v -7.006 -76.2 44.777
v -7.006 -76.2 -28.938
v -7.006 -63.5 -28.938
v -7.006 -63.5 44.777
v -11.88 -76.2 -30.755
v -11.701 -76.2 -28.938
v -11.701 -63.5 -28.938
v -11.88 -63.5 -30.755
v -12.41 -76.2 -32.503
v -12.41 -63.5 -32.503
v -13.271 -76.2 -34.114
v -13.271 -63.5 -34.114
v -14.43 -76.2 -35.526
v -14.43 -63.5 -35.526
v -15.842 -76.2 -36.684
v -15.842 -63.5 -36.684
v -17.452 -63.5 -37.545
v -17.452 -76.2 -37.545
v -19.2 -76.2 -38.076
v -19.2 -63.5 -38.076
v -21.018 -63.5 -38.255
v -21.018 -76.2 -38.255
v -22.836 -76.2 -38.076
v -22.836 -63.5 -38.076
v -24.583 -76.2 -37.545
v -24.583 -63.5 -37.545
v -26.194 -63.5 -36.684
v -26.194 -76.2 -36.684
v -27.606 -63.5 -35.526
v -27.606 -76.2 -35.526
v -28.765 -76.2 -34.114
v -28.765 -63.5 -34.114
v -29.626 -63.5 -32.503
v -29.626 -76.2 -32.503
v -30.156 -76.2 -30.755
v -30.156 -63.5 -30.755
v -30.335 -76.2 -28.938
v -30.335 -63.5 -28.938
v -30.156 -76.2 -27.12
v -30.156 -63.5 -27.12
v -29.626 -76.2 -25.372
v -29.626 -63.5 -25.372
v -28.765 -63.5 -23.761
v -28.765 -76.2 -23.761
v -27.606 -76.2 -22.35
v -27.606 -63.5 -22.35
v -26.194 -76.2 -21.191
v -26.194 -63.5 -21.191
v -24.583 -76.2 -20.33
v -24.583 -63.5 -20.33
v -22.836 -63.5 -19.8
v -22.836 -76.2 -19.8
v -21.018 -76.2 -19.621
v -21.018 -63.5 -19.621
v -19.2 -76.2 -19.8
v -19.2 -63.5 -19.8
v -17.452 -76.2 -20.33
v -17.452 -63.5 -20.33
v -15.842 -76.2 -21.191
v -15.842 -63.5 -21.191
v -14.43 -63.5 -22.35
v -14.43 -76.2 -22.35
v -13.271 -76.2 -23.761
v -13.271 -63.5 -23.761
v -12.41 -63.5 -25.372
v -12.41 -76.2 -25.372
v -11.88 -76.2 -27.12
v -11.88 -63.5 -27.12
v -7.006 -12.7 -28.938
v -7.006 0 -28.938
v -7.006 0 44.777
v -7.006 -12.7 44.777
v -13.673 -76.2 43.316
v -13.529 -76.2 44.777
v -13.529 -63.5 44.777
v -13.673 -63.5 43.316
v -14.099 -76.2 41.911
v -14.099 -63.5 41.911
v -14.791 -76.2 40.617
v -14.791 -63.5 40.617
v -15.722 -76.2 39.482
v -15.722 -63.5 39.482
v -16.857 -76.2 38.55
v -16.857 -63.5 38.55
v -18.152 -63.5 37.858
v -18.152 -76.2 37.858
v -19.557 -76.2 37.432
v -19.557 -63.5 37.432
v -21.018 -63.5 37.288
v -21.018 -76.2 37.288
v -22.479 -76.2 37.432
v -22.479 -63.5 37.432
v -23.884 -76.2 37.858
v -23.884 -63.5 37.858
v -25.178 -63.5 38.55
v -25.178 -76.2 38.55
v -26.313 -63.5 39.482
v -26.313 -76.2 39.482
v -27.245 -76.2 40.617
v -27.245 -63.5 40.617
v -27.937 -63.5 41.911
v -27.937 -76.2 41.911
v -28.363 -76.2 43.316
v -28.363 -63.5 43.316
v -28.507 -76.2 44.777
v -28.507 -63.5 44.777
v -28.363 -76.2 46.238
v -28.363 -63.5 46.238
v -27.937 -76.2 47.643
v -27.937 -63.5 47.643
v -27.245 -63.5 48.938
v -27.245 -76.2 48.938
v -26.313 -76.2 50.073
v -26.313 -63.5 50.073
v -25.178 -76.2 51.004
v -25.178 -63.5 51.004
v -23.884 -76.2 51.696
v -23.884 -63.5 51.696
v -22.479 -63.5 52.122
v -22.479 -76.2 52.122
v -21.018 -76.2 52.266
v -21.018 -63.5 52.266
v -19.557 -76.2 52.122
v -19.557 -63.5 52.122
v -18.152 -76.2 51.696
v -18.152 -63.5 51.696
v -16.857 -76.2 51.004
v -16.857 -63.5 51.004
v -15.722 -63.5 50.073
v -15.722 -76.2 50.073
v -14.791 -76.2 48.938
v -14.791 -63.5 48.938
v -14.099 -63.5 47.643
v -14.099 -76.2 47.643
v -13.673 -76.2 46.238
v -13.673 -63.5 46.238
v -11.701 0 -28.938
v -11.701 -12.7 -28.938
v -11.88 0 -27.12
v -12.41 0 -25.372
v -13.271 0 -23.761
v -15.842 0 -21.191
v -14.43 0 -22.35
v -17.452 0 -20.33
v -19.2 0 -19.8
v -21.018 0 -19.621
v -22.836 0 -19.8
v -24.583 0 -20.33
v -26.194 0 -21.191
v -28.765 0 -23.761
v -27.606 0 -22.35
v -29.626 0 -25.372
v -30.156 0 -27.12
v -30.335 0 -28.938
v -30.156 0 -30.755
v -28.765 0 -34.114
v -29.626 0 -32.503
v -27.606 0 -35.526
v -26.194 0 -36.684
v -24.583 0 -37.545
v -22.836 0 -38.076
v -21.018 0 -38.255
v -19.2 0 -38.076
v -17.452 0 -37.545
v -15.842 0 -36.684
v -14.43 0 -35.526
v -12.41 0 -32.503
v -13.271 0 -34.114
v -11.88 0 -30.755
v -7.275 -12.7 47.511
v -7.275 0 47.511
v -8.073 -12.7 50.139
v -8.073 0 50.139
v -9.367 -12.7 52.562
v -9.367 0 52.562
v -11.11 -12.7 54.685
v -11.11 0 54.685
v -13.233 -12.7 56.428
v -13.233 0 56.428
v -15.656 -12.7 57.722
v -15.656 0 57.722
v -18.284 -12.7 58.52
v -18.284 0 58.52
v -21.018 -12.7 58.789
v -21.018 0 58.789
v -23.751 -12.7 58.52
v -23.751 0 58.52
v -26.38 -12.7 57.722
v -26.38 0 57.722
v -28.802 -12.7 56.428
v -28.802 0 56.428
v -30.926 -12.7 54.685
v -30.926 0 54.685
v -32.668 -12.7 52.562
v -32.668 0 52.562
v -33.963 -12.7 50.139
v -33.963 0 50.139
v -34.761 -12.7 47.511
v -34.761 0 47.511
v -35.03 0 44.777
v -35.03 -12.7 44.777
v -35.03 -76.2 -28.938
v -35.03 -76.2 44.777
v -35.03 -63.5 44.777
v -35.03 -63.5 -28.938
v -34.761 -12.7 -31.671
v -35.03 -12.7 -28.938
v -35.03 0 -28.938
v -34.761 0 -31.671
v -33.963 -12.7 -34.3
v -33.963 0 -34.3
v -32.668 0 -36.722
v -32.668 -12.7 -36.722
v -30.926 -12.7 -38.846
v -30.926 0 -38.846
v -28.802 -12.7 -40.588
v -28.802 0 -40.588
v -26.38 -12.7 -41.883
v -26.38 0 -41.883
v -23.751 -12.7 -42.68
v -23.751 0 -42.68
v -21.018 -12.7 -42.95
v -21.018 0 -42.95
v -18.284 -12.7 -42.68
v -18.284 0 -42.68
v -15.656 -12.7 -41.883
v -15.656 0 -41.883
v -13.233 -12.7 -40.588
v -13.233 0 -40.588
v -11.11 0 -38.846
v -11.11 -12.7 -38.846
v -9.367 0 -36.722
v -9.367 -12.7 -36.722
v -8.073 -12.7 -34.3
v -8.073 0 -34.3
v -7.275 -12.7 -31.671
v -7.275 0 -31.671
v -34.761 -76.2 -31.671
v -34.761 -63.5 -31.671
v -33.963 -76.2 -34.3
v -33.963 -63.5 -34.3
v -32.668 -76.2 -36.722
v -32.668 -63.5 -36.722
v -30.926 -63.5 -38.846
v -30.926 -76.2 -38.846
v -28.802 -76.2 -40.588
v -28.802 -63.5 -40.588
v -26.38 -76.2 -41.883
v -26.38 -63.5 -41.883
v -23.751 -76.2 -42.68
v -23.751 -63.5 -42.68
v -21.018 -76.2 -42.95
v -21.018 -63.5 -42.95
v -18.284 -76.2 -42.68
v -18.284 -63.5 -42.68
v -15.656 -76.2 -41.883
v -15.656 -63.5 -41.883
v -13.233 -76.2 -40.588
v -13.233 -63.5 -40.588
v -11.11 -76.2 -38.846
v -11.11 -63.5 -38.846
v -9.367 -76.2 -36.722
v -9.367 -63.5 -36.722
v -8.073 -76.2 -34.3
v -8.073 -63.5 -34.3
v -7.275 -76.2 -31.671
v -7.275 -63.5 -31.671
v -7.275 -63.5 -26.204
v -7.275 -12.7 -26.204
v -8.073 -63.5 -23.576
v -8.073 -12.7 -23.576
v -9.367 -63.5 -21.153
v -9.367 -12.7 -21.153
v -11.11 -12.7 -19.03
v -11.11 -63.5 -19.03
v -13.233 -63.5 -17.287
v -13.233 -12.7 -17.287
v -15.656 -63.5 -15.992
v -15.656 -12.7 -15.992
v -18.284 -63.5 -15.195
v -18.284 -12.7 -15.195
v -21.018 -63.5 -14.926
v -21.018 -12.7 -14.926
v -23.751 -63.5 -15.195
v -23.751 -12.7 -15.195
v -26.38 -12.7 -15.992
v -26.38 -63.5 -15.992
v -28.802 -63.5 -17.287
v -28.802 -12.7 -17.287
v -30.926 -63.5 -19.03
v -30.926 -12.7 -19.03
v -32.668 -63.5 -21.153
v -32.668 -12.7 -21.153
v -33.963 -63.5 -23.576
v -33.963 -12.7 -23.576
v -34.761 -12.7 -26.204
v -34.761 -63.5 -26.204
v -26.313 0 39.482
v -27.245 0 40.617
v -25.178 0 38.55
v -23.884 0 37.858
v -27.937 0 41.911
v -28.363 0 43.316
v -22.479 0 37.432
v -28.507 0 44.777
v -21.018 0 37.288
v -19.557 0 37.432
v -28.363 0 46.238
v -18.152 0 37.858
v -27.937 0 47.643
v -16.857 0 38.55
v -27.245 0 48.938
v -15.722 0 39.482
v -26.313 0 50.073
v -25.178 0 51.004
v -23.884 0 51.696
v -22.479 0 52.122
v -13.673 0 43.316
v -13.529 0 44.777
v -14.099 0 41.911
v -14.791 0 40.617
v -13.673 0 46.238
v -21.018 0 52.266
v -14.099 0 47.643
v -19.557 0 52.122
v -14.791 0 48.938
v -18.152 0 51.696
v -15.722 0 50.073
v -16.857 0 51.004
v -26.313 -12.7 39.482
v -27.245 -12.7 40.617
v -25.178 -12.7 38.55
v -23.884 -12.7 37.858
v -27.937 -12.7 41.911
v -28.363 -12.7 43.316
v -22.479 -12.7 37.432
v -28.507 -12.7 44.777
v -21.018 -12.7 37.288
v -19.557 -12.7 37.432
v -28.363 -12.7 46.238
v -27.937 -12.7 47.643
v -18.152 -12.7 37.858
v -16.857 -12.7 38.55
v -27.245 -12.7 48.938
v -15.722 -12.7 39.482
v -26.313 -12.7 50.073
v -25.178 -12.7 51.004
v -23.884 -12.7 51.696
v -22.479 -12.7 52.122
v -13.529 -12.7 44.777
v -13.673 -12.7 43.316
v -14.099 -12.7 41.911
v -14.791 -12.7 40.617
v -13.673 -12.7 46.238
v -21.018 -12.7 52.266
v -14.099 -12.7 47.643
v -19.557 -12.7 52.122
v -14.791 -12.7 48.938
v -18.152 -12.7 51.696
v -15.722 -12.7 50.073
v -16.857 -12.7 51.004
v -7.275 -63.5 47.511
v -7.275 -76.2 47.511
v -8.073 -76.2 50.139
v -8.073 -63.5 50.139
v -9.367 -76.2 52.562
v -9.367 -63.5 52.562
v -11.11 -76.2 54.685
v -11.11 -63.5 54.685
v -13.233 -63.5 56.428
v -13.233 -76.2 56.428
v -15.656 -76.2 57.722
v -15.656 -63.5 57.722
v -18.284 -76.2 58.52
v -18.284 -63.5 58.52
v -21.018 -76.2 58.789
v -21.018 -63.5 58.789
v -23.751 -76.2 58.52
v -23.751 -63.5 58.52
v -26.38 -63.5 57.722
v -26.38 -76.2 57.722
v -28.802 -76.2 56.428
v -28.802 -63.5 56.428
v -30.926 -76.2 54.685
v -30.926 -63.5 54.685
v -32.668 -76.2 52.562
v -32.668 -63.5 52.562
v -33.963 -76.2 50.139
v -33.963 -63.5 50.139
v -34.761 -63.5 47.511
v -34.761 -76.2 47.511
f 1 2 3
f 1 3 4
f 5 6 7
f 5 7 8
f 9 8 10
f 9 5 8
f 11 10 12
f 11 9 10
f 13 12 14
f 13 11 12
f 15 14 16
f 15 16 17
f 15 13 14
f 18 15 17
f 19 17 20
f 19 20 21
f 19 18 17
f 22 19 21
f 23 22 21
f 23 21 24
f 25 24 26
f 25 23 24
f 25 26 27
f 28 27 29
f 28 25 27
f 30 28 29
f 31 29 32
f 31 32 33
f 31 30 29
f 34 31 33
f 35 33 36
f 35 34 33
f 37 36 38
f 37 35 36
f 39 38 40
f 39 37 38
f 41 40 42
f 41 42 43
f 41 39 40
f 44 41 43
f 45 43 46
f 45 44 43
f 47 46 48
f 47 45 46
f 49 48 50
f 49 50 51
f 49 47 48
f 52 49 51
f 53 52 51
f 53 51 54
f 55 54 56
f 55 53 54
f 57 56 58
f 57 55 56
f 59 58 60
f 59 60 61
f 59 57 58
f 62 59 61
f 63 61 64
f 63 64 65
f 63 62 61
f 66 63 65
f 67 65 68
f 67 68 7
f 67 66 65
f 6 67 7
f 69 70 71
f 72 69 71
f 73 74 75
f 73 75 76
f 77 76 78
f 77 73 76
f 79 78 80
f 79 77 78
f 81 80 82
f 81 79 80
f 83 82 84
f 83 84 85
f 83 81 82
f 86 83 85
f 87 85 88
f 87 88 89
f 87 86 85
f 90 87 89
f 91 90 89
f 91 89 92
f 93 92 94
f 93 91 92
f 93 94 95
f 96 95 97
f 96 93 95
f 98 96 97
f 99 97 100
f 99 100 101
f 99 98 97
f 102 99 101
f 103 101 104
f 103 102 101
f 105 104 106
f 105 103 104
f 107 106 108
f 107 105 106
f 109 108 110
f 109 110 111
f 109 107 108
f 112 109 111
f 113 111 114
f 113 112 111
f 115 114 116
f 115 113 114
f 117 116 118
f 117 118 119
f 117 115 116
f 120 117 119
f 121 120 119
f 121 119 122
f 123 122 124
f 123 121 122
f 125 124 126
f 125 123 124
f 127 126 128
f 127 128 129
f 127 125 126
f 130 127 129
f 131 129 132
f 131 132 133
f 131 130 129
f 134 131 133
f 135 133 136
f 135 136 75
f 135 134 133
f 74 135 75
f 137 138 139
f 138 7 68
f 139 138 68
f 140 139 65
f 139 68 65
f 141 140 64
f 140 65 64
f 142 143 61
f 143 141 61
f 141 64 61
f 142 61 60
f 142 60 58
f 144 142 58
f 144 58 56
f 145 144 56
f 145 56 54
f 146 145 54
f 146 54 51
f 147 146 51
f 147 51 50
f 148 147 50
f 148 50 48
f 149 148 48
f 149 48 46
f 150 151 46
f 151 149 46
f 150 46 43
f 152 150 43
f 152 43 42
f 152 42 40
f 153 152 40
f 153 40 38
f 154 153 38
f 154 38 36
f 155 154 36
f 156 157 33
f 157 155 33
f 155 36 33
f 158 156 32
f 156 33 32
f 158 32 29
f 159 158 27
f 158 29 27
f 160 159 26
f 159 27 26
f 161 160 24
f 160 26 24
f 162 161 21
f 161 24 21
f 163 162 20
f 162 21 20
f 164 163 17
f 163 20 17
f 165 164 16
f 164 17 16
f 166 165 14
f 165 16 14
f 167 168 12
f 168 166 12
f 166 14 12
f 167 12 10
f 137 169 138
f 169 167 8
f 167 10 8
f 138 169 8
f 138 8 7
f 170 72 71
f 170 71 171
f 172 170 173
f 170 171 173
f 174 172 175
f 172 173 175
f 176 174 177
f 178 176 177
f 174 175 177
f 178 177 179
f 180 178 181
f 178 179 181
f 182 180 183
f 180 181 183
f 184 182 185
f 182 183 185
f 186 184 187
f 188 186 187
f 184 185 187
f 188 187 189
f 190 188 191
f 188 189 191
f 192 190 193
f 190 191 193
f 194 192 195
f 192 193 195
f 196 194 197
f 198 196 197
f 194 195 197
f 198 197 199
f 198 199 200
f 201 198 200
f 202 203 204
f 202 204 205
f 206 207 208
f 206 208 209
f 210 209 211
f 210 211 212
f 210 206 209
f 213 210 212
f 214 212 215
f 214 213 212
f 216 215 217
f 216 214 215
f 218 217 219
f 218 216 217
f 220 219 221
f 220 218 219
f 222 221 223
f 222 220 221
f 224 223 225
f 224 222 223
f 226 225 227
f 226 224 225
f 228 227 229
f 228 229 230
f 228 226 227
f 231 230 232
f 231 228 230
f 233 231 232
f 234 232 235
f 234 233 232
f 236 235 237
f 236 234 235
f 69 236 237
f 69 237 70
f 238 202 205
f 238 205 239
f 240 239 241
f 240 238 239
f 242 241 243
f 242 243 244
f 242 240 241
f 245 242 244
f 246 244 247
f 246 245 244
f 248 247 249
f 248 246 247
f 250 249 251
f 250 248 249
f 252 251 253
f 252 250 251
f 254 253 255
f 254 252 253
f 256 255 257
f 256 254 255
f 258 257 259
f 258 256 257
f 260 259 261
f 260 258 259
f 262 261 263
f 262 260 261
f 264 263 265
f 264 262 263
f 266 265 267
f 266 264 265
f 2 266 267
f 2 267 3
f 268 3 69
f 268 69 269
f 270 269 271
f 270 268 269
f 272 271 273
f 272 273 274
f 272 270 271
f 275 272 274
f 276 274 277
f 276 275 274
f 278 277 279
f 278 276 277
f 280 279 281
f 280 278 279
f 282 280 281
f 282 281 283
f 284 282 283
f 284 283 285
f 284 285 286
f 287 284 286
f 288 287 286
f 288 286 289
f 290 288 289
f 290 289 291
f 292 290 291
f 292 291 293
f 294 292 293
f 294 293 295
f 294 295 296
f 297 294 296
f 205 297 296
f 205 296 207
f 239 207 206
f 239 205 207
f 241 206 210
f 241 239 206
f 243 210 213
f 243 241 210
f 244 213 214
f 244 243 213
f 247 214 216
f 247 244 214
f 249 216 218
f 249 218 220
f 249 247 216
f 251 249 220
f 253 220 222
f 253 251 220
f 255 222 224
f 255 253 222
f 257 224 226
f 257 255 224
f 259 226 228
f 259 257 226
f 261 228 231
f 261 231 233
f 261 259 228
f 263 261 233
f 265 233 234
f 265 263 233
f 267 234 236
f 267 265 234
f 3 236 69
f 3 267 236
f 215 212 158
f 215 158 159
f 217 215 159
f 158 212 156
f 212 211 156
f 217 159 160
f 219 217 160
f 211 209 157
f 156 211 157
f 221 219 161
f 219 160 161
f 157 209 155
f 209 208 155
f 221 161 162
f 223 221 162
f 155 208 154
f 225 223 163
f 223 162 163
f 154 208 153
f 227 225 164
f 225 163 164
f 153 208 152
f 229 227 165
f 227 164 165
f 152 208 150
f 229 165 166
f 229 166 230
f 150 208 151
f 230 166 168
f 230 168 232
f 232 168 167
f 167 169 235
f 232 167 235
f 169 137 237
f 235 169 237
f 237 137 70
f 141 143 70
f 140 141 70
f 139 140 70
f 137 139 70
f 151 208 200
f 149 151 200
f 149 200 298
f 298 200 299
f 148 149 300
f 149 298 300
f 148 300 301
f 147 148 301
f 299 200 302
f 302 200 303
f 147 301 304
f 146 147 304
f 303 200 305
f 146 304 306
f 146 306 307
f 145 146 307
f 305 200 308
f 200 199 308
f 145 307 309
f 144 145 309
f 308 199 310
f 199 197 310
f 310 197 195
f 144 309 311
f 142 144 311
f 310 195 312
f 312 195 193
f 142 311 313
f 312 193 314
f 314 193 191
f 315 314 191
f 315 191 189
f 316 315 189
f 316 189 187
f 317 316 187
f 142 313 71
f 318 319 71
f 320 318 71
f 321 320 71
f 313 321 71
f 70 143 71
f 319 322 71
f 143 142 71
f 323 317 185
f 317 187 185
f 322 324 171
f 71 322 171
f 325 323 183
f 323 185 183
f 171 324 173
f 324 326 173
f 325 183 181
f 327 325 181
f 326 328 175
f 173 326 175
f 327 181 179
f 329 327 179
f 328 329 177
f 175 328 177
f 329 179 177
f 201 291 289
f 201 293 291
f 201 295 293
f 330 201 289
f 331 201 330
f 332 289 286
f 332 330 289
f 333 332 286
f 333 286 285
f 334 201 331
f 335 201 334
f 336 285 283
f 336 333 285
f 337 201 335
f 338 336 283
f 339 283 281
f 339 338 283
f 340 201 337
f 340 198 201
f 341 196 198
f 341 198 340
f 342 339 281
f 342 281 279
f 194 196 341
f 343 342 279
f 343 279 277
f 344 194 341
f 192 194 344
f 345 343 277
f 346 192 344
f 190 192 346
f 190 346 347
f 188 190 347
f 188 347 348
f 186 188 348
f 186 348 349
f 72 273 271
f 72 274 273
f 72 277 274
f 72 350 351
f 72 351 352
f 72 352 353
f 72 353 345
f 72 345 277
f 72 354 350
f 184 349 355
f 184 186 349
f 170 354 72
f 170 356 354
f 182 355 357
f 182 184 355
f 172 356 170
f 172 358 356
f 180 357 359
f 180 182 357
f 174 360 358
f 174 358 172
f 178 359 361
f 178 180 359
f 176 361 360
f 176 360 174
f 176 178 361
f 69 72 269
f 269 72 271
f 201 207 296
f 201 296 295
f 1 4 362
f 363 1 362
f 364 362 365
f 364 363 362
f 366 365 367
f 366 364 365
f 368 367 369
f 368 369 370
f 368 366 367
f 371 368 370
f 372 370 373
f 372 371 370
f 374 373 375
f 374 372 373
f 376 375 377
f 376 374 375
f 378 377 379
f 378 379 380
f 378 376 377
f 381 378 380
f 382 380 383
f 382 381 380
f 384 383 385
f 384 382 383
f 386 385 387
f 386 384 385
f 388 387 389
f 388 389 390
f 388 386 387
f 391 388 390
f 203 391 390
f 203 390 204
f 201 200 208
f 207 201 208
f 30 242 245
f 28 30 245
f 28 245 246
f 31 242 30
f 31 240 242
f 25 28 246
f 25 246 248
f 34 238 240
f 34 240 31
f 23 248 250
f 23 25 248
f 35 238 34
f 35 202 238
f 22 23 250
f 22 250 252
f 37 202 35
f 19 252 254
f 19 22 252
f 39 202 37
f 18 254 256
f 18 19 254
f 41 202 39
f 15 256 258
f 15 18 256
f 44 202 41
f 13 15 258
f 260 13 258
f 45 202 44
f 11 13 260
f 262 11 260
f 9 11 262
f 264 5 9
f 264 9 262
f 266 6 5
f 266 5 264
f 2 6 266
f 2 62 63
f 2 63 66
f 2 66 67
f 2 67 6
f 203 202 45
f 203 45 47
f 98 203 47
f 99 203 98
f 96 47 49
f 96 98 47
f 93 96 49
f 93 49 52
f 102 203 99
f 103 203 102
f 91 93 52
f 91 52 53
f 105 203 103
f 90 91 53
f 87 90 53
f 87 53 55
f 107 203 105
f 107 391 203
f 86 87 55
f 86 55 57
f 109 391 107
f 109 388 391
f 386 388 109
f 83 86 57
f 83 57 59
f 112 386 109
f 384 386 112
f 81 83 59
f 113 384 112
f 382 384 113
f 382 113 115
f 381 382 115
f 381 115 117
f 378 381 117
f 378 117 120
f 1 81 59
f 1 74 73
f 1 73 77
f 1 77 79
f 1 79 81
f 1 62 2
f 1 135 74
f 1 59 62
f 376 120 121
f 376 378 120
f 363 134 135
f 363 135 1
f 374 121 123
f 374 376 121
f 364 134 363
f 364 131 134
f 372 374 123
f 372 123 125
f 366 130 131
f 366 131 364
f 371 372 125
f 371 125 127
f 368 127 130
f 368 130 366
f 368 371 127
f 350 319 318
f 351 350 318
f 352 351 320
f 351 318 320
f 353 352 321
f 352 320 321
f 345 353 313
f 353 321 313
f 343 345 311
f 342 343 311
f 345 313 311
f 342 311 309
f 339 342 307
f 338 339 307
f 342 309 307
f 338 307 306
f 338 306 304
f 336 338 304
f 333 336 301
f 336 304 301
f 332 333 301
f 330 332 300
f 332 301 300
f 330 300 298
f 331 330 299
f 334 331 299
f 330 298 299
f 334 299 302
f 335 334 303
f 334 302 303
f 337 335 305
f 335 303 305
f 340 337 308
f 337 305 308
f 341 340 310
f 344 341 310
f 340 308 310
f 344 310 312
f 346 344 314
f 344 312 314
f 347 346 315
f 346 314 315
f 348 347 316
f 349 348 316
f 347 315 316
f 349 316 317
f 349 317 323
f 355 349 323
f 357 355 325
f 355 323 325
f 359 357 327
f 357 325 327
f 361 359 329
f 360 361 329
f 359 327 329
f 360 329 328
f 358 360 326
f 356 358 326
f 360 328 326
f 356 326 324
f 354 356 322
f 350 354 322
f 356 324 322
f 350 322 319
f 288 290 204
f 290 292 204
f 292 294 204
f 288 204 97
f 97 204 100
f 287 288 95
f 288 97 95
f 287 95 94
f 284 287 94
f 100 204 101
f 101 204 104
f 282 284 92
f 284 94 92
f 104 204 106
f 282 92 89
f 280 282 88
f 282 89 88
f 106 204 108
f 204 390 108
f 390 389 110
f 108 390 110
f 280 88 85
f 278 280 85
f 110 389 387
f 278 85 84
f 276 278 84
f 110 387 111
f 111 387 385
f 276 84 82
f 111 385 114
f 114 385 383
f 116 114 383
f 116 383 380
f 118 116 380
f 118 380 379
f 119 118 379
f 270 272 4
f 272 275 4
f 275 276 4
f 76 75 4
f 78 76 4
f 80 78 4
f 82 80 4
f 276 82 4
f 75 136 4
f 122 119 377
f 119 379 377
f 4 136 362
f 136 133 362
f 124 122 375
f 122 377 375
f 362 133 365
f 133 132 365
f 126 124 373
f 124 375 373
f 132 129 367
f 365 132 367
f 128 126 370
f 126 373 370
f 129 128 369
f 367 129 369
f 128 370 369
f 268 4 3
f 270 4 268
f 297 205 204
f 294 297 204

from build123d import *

# Parameters (mm, degrees)
F1_DEPTH = 12.7
F2_R     = 9.316955817
F3_DEPTH = 25.4


with BuildPart() as f1:
    # F0 (on Front) → F1 (new body)
    with BuildSketch(Plane.XZ):
        with BuildLine():
            ThreePointArc((-28.5067475531, 44.7771735489), (-21.0178554989, 52.2660656031), (-13.5289634447, 44.7771735489))
            Line((-13.5289634447, 44.7771735489), (-7.00595323, 44.7771735489))
            ThreePointArc((-7.00595323, 44.7771735489), (-21.0178554989, 58.7890758179), (-35.0297577679, 44.7771735489))
            Line((-35.0297577679, 44.7771735489), (-28.5067475531, 44.7771735489))
        make_face()
        with BuildLine():
            Line((-7.00595323, 44.7771735489), (-13.5289634447, 44.7771735489))
            ThreePointArc((-13.5289634447, 44.7771735489), (-21.0178554989, 37.2882814947), (-28.5067475531, 44.7771735489))
            Line((-28.5067475531, 44.7771735489), (-35.0297577679, 44.7771735489))
            Line((-35.0297577679, 44.7771735489), (-35.0297577679, -28.9376266301))
            Line((-35.0297577679, -28.9376266301), (-30.3348113159, -28.9376266301))
            ThreePointArc((-30.3348113159, -28.9376266301), (-21.0178554989, -19.6206708131), (-11.700899682, -28.9376266301))
            Line((-11.700899682, -28.9376266301), (-7.00595323, -28.9376266301))
            Line((-7.00595323, -28.9376266301), (-7.00595323, 44.7771735489))
        make_face()
        with BuildLine():
            ThreePointArc((-35.0297577679, -28.9376266301), (-21.0178554989, -42.949528899), (-7.00595323, -28.9376266301))
            Line((-7.00595323, -28.9376266301), (-11.700899682, -28.9376266301))
            ThreePointArc((-11.700899682, -28.9376266301), (-21.0178554989, -38.254582447), (-30.3348113159, -28.9376266301))
            Line((-30.3348113159, -28.9376266301), (-35.0297577679, -28.9376266301))
        make_face()
    extrude(amount=F1_DEPTH)

    # F2 (on face) → F3 (join)
    with BuildSketch(Plane.XZ.offset(12.7)):
        with BuildLine():
            ThreePointArc((-35.0297577679, -28.9376266301), (-21.0178554989, -42.949528899), (-7.00595323, -28.9376266301))
            ThreePointArc((-7.00595323, -28.9376266301), (-21.0178554989, -14.9257243611), (-35.0297577679, -28.9376266301))
        make_face()
        with Locations((-21.0178554989, -28.9376266301)):
            Circle(F2_R, mode=Mode.SUBTRACT)
    extrude(amount=F3_DEPTH)

    # F4: F1 across face


with BuildPart() as f1_1:
    add(f1.part)
    add(f1.part.mirror(Plane(origin=(-21.0178554989, -38.1, -28.9376266301), x_dir=(1, 0, 0), z_dir=(0, -1, 0))))


solid = f1_1.part
